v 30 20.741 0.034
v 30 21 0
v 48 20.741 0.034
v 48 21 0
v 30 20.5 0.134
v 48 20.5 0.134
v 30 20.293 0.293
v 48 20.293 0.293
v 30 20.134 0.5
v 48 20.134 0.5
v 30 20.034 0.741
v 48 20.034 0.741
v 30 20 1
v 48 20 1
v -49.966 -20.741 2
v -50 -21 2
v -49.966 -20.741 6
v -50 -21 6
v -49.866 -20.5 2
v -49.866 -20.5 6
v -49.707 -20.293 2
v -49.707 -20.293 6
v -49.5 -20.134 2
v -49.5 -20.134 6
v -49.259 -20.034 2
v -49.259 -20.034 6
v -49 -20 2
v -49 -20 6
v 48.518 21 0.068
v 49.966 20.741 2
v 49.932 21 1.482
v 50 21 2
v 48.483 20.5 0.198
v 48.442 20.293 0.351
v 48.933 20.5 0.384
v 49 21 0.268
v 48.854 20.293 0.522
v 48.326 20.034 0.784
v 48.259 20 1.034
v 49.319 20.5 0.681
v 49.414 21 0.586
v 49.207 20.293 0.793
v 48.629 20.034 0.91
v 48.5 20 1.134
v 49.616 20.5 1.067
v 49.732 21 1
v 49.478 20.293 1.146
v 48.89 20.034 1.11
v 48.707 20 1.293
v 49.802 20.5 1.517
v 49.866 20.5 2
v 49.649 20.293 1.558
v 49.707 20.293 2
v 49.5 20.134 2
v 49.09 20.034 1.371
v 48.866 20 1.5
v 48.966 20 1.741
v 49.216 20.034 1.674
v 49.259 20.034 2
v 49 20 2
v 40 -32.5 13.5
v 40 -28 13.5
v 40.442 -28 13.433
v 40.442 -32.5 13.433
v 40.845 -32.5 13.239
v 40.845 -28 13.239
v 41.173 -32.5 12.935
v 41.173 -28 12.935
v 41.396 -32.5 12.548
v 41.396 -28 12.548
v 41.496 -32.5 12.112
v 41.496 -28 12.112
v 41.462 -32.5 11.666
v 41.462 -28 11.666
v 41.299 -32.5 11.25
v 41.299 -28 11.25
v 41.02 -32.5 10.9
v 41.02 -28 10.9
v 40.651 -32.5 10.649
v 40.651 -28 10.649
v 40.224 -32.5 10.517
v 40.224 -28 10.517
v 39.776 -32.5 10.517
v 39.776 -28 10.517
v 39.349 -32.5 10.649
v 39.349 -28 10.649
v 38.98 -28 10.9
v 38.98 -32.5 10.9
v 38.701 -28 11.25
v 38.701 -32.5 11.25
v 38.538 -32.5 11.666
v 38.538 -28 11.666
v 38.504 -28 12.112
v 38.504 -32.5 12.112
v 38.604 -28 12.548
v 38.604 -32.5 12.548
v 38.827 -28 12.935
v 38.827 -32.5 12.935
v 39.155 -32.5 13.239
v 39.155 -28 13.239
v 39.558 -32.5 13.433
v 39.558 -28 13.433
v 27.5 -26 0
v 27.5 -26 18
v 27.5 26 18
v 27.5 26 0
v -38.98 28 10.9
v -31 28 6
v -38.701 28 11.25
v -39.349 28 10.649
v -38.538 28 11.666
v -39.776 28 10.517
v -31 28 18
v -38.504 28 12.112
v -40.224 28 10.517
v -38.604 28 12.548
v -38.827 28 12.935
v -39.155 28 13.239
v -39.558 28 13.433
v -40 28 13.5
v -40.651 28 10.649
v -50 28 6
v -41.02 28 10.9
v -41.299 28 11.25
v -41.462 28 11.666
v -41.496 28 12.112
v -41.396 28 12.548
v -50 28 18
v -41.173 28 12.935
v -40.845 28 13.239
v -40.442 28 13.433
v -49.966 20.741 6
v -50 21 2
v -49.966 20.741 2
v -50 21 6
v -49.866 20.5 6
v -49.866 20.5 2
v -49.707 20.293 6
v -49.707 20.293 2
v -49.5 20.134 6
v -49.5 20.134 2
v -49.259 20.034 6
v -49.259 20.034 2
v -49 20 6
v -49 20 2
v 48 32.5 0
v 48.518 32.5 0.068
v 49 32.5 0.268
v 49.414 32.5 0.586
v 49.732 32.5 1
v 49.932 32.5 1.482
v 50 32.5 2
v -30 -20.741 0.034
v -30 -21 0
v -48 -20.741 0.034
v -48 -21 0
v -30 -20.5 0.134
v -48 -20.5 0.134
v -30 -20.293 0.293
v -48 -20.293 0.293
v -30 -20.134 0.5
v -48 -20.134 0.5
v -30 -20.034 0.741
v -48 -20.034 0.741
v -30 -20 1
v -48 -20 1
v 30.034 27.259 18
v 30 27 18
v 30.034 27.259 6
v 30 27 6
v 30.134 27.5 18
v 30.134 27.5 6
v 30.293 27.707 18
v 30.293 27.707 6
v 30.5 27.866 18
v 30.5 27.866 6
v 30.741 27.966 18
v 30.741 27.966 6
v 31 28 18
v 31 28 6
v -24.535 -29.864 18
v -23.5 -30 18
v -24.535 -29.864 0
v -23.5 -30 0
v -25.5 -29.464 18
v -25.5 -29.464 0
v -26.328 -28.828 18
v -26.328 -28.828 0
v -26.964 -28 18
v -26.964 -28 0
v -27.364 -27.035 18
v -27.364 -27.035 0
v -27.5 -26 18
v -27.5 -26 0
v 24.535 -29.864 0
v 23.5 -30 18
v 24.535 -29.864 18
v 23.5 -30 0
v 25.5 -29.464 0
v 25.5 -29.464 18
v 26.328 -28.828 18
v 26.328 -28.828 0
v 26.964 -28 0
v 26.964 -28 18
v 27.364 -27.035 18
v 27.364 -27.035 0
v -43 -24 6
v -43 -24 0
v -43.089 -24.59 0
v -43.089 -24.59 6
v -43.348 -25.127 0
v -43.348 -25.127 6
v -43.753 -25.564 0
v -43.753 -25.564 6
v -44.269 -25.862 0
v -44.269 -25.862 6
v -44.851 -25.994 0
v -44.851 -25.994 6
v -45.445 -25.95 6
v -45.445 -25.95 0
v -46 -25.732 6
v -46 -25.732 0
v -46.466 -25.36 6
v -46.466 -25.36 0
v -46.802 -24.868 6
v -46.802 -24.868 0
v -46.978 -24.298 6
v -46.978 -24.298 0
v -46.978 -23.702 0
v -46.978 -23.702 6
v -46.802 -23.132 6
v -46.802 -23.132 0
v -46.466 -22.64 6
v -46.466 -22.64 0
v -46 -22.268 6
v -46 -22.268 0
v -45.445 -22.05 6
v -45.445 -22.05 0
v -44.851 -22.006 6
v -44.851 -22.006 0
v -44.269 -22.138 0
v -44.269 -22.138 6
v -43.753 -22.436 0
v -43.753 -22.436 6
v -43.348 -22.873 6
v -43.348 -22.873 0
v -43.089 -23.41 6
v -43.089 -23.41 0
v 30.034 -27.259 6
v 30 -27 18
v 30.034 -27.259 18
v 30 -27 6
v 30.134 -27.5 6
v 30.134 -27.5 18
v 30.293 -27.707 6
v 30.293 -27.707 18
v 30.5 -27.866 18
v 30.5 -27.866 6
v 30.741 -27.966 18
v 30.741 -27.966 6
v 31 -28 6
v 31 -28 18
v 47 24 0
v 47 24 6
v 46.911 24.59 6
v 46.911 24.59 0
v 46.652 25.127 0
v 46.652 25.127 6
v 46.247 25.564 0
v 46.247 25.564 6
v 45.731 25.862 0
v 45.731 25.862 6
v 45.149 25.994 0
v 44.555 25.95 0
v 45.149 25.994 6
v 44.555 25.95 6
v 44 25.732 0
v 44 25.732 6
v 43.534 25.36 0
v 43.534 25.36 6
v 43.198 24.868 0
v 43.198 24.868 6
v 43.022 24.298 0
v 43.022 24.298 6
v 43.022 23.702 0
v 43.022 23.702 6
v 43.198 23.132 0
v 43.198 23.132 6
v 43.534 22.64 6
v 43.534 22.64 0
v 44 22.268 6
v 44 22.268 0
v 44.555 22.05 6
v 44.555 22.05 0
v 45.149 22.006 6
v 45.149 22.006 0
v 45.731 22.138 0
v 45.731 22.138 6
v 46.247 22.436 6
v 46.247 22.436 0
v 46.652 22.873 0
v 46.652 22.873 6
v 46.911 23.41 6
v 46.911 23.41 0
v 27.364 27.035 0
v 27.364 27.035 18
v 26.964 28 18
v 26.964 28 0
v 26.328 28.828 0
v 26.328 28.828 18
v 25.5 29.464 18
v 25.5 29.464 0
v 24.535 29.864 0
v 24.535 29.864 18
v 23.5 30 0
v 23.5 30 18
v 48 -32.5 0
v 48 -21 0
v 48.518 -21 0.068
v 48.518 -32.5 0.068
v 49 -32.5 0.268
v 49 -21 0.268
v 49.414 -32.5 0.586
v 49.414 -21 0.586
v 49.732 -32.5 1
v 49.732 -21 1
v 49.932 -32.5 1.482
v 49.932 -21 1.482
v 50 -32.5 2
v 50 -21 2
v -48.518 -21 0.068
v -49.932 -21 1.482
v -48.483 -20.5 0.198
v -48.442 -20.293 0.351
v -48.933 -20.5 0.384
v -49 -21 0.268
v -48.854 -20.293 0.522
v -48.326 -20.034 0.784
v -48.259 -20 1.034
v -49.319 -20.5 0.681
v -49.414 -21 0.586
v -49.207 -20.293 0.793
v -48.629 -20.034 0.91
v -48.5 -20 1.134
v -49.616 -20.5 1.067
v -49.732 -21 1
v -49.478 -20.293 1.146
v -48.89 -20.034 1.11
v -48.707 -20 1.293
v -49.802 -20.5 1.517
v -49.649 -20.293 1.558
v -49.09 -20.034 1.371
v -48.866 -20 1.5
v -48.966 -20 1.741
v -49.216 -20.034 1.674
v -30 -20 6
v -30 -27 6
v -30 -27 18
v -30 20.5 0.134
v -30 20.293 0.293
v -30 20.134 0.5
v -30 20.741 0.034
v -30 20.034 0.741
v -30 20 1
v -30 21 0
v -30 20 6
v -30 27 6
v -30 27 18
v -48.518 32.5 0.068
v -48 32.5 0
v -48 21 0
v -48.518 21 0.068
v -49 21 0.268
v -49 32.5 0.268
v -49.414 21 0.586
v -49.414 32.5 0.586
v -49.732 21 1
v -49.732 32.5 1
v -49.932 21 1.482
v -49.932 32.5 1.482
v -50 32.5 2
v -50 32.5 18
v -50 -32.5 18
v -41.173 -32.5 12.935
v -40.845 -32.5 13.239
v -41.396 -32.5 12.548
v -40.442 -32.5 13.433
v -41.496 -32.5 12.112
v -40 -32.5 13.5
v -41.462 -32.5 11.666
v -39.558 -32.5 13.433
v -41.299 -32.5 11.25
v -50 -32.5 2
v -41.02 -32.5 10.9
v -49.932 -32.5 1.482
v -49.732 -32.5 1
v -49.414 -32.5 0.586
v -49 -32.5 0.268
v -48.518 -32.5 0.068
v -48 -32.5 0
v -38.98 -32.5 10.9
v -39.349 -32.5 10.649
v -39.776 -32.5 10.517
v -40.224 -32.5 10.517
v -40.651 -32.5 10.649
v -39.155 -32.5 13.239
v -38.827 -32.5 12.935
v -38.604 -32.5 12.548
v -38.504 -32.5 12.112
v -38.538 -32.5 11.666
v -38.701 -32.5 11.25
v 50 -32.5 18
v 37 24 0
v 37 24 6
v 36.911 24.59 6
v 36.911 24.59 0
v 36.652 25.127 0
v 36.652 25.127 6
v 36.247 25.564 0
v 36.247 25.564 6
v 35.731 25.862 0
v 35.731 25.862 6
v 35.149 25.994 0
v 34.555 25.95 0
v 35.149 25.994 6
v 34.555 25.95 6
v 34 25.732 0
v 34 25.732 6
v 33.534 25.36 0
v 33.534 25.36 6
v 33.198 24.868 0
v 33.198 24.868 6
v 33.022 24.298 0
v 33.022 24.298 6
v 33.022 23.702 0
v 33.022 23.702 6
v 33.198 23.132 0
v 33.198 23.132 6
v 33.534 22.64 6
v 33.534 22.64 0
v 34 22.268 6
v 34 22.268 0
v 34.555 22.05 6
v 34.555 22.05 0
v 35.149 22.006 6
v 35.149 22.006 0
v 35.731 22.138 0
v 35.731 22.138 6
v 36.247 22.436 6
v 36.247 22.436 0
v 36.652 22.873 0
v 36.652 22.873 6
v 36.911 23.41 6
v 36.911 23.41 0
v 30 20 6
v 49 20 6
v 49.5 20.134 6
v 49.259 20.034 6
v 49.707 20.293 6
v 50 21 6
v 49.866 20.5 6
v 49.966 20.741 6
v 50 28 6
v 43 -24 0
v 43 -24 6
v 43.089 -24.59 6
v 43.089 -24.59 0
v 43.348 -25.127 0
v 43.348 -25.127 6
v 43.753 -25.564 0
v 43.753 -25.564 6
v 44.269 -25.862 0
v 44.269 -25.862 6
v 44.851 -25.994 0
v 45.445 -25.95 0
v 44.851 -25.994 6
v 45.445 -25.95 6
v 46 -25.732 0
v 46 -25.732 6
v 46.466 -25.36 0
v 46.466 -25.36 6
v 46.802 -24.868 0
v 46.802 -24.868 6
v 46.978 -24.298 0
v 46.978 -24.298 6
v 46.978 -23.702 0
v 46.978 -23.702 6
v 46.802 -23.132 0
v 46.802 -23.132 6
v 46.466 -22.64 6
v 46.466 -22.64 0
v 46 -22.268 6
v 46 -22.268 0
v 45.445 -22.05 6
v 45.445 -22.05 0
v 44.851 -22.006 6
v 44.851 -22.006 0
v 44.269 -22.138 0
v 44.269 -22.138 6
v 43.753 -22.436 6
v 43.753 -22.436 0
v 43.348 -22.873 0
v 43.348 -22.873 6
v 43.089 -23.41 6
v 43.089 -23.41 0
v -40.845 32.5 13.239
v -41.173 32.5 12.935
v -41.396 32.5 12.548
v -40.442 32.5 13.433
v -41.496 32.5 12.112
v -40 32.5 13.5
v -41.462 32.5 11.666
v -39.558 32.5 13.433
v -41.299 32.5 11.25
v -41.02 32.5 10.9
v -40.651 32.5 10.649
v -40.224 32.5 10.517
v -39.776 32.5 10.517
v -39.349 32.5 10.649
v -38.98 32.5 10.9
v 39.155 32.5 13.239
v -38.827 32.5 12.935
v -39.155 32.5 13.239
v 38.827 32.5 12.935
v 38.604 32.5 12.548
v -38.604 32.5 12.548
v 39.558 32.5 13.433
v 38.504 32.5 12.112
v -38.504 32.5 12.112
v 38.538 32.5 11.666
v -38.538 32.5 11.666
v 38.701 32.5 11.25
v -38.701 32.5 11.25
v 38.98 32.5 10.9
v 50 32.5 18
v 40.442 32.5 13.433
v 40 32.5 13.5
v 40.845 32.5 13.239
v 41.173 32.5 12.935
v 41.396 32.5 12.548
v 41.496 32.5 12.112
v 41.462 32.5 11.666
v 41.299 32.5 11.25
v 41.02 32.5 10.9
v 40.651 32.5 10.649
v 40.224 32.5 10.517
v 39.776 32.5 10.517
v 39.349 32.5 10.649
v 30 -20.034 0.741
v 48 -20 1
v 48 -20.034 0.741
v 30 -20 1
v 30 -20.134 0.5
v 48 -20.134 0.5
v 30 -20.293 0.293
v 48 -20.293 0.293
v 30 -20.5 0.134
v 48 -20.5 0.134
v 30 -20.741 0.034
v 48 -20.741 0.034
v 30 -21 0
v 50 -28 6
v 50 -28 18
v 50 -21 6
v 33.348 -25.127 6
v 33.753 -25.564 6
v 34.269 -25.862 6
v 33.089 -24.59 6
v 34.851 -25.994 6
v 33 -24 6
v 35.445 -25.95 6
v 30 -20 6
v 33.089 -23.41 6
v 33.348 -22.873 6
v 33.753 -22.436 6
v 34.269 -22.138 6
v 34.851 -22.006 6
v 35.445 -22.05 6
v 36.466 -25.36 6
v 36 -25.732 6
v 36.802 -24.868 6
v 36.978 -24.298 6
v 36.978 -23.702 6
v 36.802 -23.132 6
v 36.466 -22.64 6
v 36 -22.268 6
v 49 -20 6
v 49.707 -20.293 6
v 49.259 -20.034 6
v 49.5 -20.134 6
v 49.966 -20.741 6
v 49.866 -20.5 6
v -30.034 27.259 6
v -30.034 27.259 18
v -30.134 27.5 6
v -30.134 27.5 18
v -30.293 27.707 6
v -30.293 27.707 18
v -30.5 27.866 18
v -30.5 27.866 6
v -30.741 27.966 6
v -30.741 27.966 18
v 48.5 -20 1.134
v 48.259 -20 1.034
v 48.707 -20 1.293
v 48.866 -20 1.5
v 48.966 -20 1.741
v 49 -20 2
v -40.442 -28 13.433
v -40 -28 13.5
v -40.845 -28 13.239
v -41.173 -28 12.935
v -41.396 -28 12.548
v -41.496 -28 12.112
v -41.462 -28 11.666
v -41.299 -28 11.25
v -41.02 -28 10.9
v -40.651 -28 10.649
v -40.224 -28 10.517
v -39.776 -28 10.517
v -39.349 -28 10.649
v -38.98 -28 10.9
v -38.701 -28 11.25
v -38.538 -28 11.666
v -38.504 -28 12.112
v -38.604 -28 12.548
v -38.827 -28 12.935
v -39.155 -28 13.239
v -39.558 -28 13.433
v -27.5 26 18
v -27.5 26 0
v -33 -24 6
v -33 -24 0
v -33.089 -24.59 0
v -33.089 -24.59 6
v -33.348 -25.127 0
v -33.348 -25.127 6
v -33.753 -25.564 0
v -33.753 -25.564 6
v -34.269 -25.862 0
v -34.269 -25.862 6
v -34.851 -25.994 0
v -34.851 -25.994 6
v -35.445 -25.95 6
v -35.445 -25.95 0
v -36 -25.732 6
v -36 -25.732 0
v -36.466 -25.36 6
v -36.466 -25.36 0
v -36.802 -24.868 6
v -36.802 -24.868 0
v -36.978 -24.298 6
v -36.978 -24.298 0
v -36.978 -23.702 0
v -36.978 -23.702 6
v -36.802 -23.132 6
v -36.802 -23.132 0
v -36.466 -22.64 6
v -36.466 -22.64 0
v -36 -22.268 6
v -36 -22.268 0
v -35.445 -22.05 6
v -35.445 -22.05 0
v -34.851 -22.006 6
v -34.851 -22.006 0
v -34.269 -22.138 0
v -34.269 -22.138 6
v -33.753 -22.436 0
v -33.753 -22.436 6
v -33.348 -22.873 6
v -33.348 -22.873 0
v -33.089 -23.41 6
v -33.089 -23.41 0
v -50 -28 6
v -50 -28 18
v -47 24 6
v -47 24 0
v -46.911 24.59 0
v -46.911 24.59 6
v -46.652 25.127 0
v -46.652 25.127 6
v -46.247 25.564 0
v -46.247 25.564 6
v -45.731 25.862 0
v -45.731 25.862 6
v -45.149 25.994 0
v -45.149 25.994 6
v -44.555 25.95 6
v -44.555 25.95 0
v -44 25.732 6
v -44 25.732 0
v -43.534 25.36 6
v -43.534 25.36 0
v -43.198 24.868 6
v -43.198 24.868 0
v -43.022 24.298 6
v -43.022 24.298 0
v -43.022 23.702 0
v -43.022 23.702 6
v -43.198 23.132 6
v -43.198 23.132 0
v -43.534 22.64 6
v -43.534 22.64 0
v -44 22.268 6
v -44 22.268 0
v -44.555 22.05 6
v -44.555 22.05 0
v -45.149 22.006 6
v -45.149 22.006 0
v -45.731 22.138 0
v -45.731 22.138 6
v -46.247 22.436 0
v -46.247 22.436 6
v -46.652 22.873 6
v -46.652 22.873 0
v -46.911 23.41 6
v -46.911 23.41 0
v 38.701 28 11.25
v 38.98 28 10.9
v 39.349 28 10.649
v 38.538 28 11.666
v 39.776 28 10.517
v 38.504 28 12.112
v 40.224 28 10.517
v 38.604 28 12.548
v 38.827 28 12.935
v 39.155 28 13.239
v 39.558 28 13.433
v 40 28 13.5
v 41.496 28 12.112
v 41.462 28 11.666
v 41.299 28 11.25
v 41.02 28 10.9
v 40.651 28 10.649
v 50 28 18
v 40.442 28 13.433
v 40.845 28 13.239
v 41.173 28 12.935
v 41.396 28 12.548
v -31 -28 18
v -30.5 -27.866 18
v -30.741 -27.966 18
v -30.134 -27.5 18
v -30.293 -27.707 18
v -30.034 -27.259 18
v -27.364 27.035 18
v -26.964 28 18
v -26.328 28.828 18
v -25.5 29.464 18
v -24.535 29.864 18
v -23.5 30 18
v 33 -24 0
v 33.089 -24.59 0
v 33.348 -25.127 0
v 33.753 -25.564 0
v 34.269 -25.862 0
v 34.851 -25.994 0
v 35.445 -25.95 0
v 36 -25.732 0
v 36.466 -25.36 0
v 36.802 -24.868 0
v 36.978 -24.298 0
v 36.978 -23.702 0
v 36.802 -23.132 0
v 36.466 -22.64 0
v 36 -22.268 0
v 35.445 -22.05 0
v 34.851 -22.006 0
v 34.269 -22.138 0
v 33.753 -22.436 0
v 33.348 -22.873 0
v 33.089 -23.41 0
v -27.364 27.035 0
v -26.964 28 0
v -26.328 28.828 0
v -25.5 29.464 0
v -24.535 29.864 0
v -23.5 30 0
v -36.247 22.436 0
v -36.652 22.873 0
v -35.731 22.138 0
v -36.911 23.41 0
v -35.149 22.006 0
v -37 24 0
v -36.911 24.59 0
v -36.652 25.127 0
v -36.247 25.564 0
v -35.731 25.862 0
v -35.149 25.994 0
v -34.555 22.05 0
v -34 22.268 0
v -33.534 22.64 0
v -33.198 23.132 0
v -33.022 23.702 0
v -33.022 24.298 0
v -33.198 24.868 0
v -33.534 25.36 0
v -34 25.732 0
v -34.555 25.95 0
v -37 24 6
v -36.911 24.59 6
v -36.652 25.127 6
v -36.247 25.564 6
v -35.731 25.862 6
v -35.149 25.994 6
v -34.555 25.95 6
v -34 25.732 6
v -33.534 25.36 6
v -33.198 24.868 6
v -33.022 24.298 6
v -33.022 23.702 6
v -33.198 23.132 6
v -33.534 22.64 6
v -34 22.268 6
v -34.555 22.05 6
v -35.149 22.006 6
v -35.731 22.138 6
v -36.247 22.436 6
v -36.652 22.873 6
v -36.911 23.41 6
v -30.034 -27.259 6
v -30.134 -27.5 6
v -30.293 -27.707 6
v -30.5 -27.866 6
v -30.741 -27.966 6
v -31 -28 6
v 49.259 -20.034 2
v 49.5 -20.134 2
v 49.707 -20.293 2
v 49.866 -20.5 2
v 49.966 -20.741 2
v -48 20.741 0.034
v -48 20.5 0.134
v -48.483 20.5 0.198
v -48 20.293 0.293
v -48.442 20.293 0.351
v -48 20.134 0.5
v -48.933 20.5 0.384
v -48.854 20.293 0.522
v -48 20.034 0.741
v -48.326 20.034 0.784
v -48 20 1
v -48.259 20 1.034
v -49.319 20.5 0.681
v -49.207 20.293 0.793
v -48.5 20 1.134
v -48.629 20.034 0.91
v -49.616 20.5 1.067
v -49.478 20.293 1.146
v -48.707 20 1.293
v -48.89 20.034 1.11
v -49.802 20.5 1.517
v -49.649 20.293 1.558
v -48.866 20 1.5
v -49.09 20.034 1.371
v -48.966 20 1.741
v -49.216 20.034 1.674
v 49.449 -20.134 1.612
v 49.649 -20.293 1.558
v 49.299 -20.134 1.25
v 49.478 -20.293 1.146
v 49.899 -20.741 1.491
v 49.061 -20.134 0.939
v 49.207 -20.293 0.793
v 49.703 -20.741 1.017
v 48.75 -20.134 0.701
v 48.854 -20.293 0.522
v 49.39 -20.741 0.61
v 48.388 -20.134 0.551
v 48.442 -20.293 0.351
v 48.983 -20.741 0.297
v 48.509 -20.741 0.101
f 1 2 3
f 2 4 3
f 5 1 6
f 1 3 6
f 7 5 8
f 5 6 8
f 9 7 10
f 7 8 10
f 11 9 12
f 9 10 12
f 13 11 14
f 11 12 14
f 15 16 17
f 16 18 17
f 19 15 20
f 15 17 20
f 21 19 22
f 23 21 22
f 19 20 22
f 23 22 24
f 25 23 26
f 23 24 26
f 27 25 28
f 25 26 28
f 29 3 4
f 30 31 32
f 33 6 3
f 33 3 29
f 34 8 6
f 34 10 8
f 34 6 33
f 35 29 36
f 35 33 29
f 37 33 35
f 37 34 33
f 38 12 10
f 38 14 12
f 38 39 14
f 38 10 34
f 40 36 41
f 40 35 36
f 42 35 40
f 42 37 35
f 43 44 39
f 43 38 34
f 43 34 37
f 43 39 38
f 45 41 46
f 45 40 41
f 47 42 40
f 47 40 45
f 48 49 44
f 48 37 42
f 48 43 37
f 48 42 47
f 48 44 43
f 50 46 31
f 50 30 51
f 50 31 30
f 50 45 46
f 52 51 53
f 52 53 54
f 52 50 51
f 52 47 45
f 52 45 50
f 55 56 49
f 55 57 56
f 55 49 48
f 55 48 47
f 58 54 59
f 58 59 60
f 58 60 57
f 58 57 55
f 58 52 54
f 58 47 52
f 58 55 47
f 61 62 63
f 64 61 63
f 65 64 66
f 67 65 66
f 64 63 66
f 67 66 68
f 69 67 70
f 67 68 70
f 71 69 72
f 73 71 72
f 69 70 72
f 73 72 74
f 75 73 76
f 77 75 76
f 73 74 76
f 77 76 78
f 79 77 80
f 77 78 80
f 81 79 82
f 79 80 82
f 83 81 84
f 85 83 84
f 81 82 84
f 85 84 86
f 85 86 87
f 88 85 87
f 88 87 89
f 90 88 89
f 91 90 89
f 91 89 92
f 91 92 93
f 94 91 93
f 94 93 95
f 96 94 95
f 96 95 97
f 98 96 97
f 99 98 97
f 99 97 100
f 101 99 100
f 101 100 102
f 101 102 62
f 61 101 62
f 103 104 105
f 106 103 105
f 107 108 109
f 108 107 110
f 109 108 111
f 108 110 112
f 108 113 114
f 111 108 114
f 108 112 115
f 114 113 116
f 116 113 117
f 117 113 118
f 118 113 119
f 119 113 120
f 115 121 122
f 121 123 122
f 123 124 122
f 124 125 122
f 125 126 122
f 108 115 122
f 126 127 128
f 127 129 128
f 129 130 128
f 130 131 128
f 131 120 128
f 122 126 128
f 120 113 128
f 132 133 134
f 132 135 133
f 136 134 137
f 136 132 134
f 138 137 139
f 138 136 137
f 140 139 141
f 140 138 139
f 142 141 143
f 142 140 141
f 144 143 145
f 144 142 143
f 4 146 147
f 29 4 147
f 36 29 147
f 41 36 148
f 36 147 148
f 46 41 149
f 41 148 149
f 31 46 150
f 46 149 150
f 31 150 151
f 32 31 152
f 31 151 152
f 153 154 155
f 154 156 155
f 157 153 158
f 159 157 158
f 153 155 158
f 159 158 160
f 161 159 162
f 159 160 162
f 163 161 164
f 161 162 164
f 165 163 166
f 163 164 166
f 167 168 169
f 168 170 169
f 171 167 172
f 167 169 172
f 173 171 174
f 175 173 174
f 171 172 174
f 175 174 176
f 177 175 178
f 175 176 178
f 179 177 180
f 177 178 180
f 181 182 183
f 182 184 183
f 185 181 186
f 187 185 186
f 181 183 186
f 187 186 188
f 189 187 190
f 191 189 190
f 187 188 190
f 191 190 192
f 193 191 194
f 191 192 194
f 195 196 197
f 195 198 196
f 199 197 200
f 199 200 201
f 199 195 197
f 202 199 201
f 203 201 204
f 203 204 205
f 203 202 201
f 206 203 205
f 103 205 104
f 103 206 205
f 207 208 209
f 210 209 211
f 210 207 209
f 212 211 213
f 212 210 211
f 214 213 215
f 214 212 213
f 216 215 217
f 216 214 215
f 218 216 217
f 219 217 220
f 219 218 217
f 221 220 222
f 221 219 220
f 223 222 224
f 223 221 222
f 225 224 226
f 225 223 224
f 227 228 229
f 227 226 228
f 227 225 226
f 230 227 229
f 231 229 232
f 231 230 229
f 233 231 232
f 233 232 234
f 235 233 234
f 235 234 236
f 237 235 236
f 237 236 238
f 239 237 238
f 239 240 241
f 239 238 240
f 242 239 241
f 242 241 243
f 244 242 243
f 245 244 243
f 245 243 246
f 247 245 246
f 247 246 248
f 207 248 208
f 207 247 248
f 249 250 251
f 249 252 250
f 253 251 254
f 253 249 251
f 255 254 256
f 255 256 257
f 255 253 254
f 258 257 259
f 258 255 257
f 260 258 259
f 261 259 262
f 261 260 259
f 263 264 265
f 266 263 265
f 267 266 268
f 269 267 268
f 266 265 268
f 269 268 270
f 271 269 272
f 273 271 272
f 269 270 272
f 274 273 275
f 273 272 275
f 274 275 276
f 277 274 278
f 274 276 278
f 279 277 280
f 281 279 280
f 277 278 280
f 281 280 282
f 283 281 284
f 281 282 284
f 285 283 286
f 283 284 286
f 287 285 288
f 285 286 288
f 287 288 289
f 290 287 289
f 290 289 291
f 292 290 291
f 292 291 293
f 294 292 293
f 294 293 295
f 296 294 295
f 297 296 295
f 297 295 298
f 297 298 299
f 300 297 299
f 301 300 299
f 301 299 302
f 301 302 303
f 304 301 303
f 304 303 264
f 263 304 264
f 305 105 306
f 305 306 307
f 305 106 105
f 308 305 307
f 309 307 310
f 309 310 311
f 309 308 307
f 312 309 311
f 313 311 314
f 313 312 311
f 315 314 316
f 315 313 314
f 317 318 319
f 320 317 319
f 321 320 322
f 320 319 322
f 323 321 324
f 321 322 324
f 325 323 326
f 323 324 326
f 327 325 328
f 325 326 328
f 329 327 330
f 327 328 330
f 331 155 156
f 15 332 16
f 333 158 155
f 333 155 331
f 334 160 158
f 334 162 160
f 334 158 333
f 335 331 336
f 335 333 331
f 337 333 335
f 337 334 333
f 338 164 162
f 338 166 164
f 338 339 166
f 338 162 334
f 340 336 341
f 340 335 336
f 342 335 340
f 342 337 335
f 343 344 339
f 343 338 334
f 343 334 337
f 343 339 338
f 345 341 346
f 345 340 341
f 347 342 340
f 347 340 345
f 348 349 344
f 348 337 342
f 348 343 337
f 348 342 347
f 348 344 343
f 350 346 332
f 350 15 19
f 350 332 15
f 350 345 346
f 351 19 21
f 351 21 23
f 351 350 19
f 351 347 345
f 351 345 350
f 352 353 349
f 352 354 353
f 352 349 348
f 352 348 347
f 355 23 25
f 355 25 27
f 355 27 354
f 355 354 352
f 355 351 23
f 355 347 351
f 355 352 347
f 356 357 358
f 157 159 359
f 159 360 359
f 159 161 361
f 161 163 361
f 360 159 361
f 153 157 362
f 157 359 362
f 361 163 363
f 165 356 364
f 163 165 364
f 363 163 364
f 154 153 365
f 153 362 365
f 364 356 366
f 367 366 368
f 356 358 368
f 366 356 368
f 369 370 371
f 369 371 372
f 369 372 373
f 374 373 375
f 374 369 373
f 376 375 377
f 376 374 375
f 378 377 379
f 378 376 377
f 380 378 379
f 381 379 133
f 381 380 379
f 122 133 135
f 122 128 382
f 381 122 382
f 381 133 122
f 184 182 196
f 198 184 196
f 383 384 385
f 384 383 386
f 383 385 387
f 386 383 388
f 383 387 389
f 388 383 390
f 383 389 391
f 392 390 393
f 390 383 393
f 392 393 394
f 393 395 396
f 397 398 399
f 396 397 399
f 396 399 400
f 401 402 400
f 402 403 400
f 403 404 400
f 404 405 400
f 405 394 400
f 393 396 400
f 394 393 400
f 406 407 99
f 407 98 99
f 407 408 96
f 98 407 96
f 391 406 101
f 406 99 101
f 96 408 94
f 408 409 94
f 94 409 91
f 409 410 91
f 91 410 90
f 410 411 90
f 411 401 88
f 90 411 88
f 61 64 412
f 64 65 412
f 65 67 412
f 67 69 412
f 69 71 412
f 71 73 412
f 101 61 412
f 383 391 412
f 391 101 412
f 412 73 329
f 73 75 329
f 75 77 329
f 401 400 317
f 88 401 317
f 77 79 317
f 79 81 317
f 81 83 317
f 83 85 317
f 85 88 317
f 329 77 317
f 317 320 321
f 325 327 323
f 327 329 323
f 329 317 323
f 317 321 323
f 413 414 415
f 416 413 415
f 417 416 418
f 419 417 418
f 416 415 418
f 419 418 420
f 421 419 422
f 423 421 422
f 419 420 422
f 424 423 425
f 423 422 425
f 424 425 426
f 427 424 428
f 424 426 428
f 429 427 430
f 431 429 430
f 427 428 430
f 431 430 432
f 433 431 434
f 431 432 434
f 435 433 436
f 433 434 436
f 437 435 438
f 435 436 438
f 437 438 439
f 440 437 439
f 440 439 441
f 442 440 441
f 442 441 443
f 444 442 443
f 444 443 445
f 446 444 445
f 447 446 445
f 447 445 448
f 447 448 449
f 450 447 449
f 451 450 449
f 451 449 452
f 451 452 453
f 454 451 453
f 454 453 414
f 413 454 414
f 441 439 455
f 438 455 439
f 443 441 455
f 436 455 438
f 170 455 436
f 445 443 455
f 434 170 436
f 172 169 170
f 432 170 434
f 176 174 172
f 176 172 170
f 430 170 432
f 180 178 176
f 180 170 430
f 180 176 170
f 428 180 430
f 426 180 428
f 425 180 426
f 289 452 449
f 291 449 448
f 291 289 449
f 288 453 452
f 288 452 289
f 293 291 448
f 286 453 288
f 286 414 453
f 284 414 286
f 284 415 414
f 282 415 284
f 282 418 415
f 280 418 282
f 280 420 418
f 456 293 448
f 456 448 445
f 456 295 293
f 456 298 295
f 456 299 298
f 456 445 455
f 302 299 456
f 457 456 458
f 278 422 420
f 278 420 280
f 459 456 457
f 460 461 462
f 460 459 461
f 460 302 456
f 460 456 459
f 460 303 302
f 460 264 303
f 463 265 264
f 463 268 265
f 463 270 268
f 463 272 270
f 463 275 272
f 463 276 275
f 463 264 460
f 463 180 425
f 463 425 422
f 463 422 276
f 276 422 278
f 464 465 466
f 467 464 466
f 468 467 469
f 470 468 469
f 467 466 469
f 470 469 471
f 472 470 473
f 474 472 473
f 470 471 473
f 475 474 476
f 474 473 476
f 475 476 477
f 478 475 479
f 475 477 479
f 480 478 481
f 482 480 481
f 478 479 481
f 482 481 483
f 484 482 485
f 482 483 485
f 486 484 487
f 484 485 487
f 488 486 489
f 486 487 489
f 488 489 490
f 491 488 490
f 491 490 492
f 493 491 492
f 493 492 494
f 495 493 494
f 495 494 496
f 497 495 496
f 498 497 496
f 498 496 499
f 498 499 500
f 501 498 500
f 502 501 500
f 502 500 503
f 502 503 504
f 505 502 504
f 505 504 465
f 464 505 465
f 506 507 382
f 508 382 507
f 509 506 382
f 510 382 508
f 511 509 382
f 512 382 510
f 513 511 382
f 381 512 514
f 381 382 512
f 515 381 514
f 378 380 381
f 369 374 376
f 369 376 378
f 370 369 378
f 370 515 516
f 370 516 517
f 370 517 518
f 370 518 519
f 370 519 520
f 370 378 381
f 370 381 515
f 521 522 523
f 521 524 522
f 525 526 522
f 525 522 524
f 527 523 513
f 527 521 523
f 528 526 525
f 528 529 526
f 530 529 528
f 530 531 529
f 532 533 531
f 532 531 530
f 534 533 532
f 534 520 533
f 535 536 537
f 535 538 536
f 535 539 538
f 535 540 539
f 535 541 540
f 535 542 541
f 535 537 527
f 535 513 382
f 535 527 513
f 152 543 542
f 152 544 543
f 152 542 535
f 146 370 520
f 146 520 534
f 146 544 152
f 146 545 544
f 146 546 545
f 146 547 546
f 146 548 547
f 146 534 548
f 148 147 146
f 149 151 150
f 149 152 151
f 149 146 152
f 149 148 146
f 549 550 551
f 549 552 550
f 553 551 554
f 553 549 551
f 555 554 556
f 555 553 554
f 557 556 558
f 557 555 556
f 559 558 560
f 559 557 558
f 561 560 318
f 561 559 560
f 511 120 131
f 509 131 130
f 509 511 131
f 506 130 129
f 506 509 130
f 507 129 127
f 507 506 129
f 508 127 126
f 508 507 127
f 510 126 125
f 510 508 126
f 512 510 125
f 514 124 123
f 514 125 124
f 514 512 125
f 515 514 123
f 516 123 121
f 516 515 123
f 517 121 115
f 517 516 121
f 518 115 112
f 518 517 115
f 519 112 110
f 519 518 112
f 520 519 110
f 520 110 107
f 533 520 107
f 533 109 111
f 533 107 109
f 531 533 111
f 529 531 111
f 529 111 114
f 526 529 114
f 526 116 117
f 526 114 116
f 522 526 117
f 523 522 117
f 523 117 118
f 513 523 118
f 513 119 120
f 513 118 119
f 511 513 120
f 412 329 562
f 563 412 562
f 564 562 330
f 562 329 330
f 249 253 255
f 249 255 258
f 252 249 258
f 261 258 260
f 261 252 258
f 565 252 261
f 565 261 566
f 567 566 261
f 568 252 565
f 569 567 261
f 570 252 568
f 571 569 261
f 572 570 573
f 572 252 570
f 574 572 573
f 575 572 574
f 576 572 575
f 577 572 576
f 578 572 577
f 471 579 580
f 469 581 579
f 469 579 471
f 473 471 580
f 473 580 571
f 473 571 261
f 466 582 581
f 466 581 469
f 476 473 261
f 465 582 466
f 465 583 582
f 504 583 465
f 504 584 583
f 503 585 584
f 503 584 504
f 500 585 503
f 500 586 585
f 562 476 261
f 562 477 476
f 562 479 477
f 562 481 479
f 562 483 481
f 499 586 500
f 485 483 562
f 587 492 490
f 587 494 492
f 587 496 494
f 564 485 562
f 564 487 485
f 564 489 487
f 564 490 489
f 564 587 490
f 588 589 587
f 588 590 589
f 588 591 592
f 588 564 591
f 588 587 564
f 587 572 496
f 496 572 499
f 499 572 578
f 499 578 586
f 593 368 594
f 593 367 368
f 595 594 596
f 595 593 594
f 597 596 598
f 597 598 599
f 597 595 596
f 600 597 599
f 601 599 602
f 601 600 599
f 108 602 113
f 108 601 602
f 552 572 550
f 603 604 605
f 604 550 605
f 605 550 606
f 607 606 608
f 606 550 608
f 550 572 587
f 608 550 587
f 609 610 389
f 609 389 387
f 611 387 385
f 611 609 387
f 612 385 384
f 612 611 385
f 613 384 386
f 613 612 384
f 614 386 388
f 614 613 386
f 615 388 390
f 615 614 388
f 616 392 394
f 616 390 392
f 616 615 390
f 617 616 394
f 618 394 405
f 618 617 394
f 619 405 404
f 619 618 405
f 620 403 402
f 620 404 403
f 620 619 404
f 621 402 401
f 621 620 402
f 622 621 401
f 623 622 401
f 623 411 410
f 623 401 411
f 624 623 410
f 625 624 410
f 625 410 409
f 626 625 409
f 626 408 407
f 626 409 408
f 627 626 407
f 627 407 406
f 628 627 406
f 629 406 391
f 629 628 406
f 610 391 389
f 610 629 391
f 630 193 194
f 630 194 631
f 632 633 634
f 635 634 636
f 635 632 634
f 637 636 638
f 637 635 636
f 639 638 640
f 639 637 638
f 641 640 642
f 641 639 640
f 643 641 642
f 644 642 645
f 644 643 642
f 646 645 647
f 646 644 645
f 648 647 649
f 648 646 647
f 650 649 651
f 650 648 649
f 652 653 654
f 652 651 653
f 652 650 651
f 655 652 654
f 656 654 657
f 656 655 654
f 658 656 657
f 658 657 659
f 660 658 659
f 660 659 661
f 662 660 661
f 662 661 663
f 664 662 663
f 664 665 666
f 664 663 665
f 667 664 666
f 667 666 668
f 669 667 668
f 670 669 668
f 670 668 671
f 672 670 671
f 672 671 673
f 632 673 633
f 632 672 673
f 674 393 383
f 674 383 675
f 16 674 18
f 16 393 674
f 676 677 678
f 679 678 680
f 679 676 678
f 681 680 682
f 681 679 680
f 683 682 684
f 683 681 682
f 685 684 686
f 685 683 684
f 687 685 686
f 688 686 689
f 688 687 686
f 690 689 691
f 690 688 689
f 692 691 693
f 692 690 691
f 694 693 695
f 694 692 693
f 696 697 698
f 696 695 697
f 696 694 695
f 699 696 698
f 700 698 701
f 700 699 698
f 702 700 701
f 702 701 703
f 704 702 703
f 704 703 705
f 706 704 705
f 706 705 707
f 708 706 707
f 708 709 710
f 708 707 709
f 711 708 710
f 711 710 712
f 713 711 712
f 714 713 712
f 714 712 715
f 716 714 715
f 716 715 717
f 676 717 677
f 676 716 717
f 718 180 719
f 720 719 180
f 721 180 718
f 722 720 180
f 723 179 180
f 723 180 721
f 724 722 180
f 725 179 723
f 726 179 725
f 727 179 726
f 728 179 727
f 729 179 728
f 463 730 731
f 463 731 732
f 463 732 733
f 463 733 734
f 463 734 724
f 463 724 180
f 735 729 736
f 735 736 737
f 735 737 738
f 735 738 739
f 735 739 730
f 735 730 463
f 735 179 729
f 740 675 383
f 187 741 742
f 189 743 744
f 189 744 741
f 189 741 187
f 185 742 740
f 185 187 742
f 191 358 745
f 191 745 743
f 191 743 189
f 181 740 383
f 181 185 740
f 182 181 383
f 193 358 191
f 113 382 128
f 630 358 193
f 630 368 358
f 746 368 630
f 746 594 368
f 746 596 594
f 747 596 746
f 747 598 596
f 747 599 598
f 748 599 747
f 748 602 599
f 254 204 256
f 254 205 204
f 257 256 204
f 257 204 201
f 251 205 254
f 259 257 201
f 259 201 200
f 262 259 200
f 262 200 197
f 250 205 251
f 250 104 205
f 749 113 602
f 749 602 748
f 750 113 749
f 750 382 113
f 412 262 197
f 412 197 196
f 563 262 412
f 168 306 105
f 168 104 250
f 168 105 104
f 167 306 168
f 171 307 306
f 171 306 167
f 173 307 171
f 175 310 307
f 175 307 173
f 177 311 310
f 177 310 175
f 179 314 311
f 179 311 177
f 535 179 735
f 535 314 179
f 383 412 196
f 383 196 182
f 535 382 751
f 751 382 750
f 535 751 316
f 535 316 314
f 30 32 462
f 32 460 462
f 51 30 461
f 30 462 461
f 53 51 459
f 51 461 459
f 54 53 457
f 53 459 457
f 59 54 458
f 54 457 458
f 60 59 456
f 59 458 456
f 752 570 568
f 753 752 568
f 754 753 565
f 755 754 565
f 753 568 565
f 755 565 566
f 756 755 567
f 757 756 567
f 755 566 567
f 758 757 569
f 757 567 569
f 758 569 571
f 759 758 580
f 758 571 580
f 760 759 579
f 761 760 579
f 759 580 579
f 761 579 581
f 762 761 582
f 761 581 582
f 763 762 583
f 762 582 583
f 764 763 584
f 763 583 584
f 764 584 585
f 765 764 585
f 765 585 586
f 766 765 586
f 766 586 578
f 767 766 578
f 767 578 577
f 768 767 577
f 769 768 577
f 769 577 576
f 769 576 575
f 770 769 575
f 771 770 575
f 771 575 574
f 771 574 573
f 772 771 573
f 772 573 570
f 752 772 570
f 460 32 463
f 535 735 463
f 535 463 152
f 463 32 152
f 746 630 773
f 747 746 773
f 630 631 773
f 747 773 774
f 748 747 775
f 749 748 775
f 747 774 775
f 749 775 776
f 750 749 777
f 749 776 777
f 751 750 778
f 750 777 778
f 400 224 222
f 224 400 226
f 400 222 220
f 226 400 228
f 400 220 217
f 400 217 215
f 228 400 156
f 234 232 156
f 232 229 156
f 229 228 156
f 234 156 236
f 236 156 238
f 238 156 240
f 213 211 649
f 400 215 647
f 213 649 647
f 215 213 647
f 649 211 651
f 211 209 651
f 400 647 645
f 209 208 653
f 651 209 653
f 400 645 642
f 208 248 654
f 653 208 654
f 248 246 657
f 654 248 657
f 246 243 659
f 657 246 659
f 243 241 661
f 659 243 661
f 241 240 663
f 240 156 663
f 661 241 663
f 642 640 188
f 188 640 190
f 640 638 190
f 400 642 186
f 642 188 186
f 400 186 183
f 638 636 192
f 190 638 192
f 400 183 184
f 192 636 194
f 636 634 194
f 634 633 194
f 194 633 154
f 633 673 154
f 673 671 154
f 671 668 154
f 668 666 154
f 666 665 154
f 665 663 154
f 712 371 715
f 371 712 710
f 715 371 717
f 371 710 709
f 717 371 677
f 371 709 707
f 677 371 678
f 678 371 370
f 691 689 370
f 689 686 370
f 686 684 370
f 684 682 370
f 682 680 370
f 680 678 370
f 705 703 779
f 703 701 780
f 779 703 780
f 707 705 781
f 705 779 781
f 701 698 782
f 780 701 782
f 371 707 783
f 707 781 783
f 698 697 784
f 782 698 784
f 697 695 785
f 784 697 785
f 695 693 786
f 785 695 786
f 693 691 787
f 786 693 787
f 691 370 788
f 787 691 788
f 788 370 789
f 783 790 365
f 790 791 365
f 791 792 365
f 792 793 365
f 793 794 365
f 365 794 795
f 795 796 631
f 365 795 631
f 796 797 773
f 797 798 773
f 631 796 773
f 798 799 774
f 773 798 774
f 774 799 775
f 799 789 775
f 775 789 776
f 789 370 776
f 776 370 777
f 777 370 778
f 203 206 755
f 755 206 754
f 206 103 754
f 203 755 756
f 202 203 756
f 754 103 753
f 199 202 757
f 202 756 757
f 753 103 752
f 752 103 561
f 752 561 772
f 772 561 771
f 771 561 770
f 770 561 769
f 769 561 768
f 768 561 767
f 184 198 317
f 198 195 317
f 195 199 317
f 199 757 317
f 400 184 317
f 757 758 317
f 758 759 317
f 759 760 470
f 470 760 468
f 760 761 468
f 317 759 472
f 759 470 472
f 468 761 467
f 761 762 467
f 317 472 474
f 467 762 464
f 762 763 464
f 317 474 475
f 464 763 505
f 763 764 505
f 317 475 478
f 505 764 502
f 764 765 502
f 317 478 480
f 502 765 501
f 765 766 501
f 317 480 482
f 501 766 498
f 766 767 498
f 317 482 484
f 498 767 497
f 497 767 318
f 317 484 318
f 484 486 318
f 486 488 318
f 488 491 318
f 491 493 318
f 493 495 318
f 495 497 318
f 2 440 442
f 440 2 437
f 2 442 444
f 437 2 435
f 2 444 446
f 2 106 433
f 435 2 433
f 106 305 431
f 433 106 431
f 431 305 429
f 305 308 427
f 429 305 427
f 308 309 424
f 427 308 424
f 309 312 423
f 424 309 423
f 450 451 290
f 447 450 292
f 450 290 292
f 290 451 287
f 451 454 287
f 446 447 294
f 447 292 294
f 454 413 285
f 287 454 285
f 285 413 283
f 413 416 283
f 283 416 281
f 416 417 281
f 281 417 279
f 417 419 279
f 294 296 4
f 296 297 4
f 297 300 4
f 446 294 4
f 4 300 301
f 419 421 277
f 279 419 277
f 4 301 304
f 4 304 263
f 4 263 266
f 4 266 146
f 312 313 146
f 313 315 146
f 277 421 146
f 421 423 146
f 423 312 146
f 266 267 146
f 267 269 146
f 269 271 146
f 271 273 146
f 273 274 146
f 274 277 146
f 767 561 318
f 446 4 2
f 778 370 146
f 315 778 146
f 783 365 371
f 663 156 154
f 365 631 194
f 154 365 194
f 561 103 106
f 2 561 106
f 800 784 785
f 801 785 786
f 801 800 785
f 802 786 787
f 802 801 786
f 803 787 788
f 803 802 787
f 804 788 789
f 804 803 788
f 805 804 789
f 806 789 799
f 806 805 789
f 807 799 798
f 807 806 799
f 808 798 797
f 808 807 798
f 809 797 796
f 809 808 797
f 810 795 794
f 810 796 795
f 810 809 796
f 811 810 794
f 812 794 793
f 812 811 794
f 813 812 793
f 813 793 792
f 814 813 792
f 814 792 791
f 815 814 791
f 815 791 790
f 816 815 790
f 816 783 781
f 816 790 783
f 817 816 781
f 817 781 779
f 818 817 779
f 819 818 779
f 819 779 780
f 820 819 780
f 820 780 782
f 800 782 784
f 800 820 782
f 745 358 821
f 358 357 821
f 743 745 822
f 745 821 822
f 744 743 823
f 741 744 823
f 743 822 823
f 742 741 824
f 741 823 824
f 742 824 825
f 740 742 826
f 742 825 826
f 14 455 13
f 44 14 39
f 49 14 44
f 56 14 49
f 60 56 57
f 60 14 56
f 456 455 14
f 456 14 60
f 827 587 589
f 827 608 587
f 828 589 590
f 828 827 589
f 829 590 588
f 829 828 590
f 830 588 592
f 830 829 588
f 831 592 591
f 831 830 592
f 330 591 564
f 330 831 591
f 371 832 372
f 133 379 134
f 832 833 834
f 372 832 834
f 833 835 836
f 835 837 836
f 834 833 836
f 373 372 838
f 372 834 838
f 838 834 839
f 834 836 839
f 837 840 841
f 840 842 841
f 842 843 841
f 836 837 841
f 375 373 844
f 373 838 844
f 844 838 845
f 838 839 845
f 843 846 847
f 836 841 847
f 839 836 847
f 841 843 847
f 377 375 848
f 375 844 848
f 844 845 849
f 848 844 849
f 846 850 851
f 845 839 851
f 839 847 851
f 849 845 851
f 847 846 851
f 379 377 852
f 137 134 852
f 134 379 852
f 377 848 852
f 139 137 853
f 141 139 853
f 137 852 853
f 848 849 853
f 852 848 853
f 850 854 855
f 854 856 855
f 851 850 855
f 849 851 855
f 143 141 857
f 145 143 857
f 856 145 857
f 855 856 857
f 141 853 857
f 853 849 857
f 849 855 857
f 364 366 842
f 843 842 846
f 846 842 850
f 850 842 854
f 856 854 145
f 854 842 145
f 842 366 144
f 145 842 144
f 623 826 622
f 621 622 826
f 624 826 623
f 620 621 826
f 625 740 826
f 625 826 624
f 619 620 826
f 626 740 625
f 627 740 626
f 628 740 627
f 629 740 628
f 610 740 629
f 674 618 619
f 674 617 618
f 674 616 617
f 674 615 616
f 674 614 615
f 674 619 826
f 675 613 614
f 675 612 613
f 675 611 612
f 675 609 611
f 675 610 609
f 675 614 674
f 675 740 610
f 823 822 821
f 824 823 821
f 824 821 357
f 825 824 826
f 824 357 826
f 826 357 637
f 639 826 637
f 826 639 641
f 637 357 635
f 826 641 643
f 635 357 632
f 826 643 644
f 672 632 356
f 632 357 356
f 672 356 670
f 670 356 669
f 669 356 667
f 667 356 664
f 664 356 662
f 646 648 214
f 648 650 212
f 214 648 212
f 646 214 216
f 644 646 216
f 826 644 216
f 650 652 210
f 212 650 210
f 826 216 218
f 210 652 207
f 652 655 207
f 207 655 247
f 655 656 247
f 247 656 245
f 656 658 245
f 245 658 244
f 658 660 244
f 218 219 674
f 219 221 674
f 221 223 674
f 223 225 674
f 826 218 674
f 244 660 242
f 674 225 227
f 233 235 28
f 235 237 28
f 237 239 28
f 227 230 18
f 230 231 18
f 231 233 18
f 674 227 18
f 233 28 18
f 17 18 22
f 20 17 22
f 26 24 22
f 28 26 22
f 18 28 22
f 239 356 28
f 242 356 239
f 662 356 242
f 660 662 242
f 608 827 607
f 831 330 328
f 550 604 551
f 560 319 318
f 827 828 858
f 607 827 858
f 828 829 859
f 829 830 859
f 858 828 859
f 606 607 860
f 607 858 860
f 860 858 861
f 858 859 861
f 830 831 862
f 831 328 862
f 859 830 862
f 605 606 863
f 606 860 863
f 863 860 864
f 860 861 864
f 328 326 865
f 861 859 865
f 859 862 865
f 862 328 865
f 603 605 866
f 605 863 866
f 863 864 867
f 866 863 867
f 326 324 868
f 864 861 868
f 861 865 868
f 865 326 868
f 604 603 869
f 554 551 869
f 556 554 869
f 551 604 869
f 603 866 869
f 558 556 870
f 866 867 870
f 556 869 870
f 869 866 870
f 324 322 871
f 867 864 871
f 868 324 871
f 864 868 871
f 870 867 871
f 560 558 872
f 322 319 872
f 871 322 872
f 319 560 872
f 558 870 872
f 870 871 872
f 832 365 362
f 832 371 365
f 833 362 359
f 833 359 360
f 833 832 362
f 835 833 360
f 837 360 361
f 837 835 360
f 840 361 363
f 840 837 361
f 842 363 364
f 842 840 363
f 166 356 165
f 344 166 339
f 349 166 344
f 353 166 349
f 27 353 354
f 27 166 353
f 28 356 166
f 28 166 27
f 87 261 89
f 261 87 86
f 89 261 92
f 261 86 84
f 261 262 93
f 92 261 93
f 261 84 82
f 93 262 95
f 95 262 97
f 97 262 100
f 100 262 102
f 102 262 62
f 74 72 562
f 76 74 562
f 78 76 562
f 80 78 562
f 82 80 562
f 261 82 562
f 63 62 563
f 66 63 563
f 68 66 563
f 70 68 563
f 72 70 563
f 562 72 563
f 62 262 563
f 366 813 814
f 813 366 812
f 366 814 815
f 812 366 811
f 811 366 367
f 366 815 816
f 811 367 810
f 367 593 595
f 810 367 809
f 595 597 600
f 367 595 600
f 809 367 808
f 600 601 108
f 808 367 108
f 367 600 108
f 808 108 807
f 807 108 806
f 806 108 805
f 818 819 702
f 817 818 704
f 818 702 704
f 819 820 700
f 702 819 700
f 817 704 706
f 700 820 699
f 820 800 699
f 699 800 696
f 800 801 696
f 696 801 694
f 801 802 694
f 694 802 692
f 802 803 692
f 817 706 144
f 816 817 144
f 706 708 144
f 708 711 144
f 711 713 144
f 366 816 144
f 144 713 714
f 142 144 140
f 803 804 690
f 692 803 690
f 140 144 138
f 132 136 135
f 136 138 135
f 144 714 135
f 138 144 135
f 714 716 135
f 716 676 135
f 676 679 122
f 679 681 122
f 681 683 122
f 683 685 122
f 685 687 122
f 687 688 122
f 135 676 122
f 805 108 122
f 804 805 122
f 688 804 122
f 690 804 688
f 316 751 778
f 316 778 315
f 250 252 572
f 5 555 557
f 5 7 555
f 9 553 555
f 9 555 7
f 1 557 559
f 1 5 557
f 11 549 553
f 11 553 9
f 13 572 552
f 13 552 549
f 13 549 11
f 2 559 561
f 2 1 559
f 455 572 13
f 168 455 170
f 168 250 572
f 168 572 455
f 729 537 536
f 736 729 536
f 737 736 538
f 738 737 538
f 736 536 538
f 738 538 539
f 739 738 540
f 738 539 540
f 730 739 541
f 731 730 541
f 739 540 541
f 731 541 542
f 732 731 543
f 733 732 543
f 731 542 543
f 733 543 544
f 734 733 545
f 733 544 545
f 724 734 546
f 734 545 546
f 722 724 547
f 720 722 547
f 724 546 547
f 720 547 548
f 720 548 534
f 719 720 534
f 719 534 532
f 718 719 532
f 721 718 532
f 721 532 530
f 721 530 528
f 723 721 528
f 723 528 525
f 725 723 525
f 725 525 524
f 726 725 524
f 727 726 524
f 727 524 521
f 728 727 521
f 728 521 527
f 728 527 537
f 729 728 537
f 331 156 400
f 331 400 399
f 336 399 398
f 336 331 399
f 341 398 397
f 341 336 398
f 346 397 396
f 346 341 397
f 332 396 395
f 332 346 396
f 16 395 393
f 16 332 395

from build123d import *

# Parameters (mm, degrees)
SKETCH_1_W          = 100
SKETCH_1_H          = 65
EXTRUDE_1_DEPTH     = 18
SKETCH_2_W          = 55
SKETCH_2_H          = 60
CUT_EXTRUDE_1_DEPTH = 63.291652731
SKETCH_3_W          = 20
SKETCH_3_H          = 56
CUT_EXTRUDE_2_DEPTH = 12
SKETCH_4_W          = 20
SKETCH_4_H          = 40
CUT_EXTRUDE_3_DEPTH = 61.829680256
SKETCH_5_R          = 2
CUT_EXTRUDE_4_DEPTH = 61.829680256
SKETCH_6_R          = 1.5
CUT_EXTRUDE_5_DEPTH = 84.958322994
FILLET_1_R          = 4
FILLET_2_R          = 2
FILLET_3_R          = 1


with BuildPart() as part:
    # 草图1 → 凸台-拉伸1 (new body)
    with BuildSketch(Plane.XY):
        Rectangle(SKETCH_1_W, SKETCH_1_H)
    extrude(amount=EXTRUDE_1_DEPTH)

    # 草图2 → 切除-拉伸1 (cut, through all)
    with BuildSketch(Plane.XY.offset(18)):
        Rectangle(SKETCH_2_W, SKETCH_2_H)
    extrude(amount=-CUT_EXTRUDE_1_DEPTH, mode=Mode.SUBTRACT)

    # 草图3 → 切除-拉伸2 (cut)
    with BuildSketch(Plane.XY.offset(18)):
        with Locations((40, 0)):
            Rectangle(SKETCH_3_W, SKETCH_3_H)
    cut_extrude_2 = extrude(amount=-CUT_EXTRUDE_2_DEPTH, mode=Mode.SUBTRACT)

    # 草图4 → 切除-拉伸3 (cut, through all)
    with BuildSketch(Plane.XY.offset(6)):
        with Locations((40, 0)):
            Rectangle(SKETCH_4_W, SKETCH_4_H)
    cut_extrude_3 = extrude(amount=-CUT_EXTRUDE_3_DEPTH, mode=Mode.SUBTRACT)

    # 草图5 → 切除-拉伸4 (cut, through all)
    with BuildSketch(Plane.XY.offset(6)):
        with Locations((45, 24)):
            Circle(SKETCH_5_R)
        with Locations((35, 24)):
            Circle(SKETCH_5_R)
        with Locations(Location((35, -24, 0), (0, 0, 180))):
            Circle(SKETCH_5_R)
        with Locations(Location((45, -24, 0), (0, 0, 180))):
            Circle(SKETCH_5_R)
    cut_extrude_4 = extrude(amount=-CUT_EXTRUDE_4_DEPTH, mode=Mode.SUBTRACT)

    # 草图6 → 切除-拉伸5 (cut, through all)
    with BuildSketch(Plane(origin=(0, 32.5, 0), x_dir=(1, 0, 0), z_dir=(0, 1, 0))):
        with Locations(Location((40, -12, 0), (0, 0, 270))):
            Circle(SKETCH_6_R)
    cut_extrude_5 = extrude(amount=-CUT_EXTRUDE_5_DEPTH, mode=Mode.SUBTRACT)

    # 镜向1: 切除-拉伸2, 切除-拉伸3, 切除-拉伸4, 切除-拉伸5 across plane
    add(cut_extrude_2.mirror(Plane(origin=(0, 0, 0), x_dir=(0, 0, 1), z_dir=(1, 0, 0))), mode=Mode.SUBTRACT)
    add(cut_extrude_3.mirror(Plane(origin=(0, 0, 0), x_dir=(0, 0, 1), z_dir=(1, 0, 0))), mode=Mode.SUBTRACT)
    add(cut_extrude_4.mirror(Plane(origin=(0, 0, 0), x_dir=(0, 0, 1), z_dir=(1, 0, 0))), mode=Mode.SUBTRACT)
    add(cut_extrude_5.mirror(Plane(origin=(0, 0, 0), x_dir=(0, 0, 1), z_dir=(1, 0, 0))), mode=Mode.SUBTRACT)

    # 圆角1
    fillet_1_edges = [part.edges().sort_by_distance(p)[0] for p in [
        (27.5, 30, 9),
        (27.5, -30, 9),
        (-27.5, -30, 9),
        (-27.5, 30, 9),
    ]]
    fillet(fillet_1_edges, radius=FILLET_1_R)

    # 圆角2
    fillet_2_edges = [part.edges().sort_by_distance(p)[0] for p in [
        (50, 26.25, 0),
        (-50, 26.25, 0),
        (50, -26.25, 0),
        (-50, -26.25, 0),
    ]]
    fillet(fillet_2_edges, radius=FILLET_2_R)

    # 圆角3
    fillet_3_edges = [part.edges().sort_by_distance(p)[0] for p in [
        (-39, -20, 0),
        (-50, -20, 4),
        (-39, 20, 0),
        (39, 20, 0),
        (-49.414213562, -20, 0.585786438),
        (-50, 20, 4),
        (-49.414213562, 20, 0.585786438),
        (50, -20, 4),
        (49.414213562, -20, 0.585786438),
        (50, 20, 4),
        (49.414213562, 20, 0.585786438),
        (30, 28, 12),
        (30, -28, 12),
        (39, -20, 0),
        (-30, 28, 12),
        (-30, -28, 12),
    ]]
    fillet(fillet_3_edges, radius=FILLET_3_R)


solid = part.part
